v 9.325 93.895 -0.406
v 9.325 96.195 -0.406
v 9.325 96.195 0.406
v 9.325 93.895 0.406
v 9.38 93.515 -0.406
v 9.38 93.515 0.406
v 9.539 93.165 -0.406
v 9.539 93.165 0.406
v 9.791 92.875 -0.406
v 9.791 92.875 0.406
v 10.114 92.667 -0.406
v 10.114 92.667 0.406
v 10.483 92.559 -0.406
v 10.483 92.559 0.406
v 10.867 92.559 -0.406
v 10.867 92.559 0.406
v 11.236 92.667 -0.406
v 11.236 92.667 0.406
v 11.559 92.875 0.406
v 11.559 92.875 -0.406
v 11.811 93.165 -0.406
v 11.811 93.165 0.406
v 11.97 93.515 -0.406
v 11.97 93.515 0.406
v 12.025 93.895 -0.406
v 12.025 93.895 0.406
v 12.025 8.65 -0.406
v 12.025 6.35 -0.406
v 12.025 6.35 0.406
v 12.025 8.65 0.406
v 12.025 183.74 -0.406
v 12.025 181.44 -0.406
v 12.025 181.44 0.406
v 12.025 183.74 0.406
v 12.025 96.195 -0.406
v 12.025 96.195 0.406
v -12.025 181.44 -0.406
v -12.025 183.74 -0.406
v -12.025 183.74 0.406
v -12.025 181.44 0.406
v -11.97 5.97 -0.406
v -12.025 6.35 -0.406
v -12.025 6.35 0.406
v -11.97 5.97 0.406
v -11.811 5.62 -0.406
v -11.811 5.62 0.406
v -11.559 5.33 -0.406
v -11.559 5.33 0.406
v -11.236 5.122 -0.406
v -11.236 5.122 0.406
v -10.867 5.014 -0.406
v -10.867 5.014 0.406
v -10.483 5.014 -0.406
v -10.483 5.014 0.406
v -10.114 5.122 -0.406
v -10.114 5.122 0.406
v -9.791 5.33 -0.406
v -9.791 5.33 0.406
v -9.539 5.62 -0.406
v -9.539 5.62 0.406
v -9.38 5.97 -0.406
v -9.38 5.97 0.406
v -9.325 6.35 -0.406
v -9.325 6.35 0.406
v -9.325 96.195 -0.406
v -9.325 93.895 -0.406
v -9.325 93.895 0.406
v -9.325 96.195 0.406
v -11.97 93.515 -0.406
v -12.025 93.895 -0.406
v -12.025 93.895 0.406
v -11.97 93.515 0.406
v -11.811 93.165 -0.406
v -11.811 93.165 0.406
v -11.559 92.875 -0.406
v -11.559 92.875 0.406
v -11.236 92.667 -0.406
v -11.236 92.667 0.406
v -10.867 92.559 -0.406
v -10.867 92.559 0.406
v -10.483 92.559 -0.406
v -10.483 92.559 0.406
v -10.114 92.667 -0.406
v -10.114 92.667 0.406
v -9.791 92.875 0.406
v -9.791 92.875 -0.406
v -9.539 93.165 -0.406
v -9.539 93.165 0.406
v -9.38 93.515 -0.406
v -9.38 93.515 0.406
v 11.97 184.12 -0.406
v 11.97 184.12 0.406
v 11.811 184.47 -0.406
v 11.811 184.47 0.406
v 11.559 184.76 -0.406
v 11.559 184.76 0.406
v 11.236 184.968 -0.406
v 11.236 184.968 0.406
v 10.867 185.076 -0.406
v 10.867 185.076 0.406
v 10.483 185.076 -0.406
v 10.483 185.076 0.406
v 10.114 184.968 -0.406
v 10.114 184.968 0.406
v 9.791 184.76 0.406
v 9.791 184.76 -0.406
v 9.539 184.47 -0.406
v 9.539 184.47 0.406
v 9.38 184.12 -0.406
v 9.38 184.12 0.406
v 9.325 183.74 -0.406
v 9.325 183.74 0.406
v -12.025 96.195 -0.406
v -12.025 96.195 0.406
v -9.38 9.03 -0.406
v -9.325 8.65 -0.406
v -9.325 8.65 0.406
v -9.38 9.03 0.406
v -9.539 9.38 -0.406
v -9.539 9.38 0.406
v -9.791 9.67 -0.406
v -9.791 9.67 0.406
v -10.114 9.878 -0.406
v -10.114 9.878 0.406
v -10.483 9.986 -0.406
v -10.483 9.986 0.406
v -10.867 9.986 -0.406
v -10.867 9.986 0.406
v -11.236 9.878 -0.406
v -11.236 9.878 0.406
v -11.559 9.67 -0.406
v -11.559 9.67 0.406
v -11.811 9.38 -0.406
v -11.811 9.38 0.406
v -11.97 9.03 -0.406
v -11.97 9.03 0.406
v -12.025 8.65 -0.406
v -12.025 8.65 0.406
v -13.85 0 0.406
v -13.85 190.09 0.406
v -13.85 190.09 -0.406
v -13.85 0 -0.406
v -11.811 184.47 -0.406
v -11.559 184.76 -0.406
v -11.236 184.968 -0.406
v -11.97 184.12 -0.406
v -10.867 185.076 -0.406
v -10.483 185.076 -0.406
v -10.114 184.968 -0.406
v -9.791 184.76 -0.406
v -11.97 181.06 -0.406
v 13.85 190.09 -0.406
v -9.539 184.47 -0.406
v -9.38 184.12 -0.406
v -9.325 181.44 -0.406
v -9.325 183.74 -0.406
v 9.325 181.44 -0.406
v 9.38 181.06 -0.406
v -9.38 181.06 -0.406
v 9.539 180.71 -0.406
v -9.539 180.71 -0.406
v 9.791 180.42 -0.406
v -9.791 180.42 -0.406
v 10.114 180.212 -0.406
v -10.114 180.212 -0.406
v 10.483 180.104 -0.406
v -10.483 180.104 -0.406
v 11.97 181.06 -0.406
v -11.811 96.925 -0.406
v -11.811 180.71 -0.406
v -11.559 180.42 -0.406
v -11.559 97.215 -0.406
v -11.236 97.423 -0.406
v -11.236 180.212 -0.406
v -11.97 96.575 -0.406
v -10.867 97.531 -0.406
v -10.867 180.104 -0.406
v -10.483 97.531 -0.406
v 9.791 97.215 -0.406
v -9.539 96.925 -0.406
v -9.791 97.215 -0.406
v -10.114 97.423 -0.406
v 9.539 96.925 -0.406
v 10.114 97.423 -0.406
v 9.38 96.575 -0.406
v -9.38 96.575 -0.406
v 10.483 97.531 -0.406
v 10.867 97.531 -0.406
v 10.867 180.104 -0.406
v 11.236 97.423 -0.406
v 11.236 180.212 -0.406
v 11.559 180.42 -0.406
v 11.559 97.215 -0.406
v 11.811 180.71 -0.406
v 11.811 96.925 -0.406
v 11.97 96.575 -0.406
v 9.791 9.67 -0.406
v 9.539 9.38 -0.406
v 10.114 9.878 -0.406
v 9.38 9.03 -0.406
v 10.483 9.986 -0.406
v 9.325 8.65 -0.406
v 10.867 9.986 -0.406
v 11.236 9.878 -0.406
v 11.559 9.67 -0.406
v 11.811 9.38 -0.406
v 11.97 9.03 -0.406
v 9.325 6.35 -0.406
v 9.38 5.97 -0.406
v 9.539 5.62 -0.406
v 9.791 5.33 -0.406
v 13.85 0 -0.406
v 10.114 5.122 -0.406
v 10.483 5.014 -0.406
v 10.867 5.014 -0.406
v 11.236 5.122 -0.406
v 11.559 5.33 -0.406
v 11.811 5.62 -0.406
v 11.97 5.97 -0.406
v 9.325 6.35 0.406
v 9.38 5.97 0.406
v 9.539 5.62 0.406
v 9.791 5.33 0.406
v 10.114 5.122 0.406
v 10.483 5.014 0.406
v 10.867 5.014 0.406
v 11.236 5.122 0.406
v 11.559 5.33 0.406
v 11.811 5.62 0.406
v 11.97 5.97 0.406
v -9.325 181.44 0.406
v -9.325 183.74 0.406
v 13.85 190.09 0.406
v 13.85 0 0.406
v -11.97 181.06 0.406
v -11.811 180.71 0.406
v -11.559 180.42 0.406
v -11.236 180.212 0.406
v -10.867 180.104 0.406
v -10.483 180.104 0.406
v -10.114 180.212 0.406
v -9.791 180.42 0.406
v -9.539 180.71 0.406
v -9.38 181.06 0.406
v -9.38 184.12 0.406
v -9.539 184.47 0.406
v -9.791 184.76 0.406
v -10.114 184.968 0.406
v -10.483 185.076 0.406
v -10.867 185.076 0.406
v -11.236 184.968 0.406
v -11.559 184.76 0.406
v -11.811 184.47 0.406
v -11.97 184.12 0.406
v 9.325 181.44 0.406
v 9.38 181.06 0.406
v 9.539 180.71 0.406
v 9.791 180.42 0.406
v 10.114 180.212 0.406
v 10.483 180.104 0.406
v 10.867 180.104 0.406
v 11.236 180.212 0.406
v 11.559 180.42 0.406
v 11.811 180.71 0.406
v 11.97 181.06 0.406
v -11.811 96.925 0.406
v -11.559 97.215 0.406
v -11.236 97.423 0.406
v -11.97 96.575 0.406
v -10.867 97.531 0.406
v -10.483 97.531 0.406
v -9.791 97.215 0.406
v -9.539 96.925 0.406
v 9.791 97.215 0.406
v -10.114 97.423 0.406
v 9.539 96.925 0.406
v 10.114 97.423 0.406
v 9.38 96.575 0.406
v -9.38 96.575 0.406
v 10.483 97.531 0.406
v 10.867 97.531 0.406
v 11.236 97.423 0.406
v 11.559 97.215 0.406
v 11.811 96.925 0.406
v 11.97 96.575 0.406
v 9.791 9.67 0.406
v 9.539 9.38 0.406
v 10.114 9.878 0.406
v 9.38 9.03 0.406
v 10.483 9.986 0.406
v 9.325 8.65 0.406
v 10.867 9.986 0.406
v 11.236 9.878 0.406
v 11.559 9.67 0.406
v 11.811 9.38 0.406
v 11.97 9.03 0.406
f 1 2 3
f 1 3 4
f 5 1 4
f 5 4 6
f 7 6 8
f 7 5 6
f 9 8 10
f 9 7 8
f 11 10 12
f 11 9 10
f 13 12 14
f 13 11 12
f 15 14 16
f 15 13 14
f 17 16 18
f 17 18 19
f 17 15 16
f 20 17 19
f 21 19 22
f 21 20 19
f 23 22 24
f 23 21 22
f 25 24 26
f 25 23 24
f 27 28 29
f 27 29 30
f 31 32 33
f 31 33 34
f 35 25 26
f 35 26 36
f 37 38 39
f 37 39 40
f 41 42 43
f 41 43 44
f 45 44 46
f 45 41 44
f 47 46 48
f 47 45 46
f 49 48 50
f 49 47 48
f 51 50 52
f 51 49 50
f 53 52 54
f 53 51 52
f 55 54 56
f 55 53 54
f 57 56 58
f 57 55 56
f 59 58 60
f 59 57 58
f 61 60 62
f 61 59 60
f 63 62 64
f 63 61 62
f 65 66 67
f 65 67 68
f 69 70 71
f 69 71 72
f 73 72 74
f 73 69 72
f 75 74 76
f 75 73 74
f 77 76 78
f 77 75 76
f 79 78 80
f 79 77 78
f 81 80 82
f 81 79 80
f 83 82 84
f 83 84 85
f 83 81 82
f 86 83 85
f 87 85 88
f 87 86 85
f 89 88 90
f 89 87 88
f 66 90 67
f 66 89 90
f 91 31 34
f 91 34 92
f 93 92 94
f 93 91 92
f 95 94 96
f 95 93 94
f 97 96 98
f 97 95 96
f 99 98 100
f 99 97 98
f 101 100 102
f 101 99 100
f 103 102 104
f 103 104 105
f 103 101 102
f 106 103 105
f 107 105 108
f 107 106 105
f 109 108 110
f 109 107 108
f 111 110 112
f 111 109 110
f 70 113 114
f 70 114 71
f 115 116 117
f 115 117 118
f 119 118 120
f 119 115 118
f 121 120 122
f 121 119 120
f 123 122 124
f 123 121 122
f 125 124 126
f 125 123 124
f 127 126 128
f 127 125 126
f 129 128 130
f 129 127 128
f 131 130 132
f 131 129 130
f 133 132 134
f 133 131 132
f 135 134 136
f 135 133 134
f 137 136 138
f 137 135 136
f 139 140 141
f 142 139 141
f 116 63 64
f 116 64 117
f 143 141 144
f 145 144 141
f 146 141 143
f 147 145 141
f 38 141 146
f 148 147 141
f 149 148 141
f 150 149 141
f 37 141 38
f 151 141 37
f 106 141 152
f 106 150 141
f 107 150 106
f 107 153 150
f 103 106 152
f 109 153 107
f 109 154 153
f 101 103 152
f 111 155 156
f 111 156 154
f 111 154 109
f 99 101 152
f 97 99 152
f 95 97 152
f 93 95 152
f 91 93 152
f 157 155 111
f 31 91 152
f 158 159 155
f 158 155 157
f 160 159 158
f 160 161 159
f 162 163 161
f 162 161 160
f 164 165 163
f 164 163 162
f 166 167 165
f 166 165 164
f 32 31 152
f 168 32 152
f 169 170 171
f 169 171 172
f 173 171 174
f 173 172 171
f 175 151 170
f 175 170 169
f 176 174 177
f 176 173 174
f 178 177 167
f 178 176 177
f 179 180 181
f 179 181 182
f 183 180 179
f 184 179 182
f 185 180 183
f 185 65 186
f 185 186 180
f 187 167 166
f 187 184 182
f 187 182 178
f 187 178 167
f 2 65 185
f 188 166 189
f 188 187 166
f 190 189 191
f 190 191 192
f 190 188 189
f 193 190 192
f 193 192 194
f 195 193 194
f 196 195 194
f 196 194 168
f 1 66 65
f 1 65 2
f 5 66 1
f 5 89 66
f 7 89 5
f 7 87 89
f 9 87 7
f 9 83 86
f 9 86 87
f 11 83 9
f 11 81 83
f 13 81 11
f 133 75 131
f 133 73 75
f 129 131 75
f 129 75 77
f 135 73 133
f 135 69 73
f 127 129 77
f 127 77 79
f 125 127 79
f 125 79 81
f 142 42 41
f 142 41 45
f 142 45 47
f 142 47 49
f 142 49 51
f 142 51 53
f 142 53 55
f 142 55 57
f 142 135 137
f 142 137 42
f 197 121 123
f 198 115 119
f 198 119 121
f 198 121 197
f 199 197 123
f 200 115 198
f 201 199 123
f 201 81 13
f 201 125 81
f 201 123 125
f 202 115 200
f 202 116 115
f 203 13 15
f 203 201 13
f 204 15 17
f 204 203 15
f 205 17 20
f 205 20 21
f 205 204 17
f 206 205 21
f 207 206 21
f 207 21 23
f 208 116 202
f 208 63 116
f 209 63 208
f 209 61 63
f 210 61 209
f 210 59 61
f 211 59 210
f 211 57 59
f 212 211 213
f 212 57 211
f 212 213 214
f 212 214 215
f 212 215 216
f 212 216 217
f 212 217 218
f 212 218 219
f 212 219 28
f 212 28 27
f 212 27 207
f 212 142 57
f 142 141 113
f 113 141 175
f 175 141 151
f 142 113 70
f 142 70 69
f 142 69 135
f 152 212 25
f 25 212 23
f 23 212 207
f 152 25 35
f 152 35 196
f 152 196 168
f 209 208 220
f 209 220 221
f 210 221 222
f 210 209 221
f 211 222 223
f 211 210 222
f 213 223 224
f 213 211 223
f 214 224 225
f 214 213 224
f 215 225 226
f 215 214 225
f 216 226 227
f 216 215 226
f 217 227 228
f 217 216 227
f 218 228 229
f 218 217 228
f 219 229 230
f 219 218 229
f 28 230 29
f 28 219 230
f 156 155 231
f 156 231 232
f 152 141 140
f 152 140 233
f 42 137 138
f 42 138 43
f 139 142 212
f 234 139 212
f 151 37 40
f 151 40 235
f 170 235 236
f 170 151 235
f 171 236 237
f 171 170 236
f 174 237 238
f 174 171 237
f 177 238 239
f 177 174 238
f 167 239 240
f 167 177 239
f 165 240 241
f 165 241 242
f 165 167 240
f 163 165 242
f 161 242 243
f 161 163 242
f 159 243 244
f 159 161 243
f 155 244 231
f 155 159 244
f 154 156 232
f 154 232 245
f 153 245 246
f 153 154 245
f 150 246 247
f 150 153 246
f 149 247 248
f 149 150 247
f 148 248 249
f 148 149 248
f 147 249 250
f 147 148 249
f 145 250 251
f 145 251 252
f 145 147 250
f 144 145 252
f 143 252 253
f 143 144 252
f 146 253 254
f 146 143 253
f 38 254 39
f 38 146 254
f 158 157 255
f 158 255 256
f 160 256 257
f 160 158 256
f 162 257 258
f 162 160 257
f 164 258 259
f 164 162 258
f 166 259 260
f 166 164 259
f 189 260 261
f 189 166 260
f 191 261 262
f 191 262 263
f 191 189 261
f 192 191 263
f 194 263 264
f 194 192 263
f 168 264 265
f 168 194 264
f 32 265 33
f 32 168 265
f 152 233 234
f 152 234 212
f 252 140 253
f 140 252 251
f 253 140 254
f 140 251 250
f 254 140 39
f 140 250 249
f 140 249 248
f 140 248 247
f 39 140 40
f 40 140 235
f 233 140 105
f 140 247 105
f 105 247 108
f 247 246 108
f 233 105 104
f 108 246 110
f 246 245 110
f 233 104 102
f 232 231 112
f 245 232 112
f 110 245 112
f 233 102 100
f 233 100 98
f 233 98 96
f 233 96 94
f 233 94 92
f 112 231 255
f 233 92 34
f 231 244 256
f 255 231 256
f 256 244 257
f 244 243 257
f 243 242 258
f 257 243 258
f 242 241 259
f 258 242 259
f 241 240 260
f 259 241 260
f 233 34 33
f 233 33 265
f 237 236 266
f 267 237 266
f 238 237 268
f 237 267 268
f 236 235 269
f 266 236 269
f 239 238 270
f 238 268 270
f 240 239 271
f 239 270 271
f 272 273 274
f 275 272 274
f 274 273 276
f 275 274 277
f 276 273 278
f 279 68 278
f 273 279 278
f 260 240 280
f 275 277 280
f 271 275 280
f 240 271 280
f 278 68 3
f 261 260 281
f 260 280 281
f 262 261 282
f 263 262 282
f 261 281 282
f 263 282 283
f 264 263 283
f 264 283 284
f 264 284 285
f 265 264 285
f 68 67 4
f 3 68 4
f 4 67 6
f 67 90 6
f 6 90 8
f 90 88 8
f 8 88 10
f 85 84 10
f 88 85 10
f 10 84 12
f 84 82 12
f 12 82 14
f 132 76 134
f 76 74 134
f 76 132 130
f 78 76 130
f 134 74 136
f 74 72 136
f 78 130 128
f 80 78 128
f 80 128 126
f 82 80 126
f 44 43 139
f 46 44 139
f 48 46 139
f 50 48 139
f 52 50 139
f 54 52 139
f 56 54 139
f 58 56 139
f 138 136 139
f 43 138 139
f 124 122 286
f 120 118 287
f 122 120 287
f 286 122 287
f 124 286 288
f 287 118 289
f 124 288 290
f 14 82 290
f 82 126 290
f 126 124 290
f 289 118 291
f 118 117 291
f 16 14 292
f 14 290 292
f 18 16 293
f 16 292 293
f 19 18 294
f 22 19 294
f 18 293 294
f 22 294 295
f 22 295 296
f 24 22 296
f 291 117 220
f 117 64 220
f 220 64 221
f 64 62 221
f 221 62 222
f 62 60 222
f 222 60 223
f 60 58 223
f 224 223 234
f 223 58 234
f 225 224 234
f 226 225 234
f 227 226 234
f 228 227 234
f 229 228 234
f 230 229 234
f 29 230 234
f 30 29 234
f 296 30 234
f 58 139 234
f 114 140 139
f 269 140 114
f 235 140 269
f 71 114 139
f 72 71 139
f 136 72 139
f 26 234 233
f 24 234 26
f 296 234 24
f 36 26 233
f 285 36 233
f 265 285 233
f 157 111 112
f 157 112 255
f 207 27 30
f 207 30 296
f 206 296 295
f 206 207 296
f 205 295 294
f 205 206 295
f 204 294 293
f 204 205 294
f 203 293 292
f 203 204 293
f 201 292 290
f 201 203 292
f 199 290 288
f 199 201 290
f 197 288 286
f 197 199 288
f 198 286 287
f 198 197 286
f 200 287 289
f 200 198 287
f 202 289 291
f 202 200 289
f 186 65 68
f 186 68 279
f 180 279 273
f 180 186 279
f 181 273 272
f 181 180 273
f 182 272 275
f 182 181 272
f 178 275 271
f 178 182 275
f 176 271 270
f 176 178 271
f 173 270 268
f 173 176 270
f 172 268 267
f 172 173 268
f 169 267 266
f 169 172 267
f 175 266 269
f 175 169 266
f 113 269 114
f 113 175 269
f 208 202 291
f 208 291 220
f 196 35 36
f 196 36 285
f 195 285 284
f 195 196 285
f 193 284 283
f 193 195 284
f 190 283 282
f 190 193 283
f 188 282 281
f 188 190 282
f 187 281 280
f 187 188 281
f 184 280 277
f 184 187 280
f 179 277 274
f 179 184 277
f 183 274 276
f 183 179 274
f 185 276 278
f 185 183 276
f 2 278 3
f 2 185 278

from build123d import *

# Parameters (mm, degrees)
SKETCH1_W                  = 27.7
SKETCH1_H                  = 0.8128
BOSS_EXTRUDE1_DEPTH        = 190.09
M2_5_START                 = -0.4064
M2_5_CLEARANCE_SLOT2_DEPTH = 0.8128


# Read off the part's stored shape, not the designer's step: M2.5 Clearance Slot2
with BuildPart() as part:
    # Sketch1 → Boss-Extrude1 (new body)
    with BuildSketch(Plane(origin=(0, 0, 0), x_dir=(1, 0, 0), z_dir=(0, 1, 0))):
        Rectangle(SKETCH1_W, SKETCH1_H)
    extrude(amount=BOSS_EXTRUDE1_DEPTH)

    # M2.5 Clearance Slot2 outline → M2.5 Clearance Slot2 (cut)
    with BuildSketch(Plane.XY.offset(M2_5_START)):
        with BuildLine():
            ThreePointArc((-9.325, 96.195), (-10.675, 97.545), (-12.025, 96.195))
            Line((-12.025, 96.195), (-12.025, 93.895))
            ThreePointArc((-12.025, 93.895), (-10.675, 92.545), (-9.325, 93.895))
            Line((-9.325, 93.895), (-9.325, 96.195))
        make_face()
        with BuildLine():
            Line((-9.325, 181.44), (-9.325, 183.74))
            ThreePointArc((-9.325, 183.74), (-10.675, 185.09), (-12.025, 183.74))
            Line((-12.025, 183.74), (-12.025, 181.44))
            ThreePointArc((-12.025, 181.44), (-10.675, 180.09), (-9.325, 181.44))
        make_face()
        with BuildLine():
            Line((-9.325, 6.35), (-9.325, 8.65))
            ThreePointArc((-9.325, 8.65), (-10.675, 10), (-12.025, 8.65))
            Line((-12.025, 8.65), (-12.025, 6.35))
            ThreePointArc((-12.025, 6.35), (-10.675, 5), (-9.325, 6.35))
        make_face()
        with BuildLine():
            ThreePointArc((12.025, 96.195), (10.675, 97.545), (9.325, 96.195))
            Line((9.325, 96.195), (9.325, 93.895))
            ThreePointArc((9.325, 93.895), (10.675, 92.545), (12.025, 93.895))
            Line((12.025, 93.895), (12.025, 96.195))
        make_face()
        with BuildLine():
            Line((12.025, 181.44), (12.025, 183.74))
            ThreePointArc((12.025, 183.74), (10.675, 185.09), (9.325, 183.74))
            Line((9.325, 183.74), (9.325, 181.44))
            ThreePointArc((9.325, 181.44), (10.675, 180.09), (12.025, 181.44))
        make_face()
        with BuildLine():
            Line((12.025, 6.35), (12.025, 8.65))
            ThreePointArc((12.025, 8.65), (10.675, 10), (9.325, 8.65))
            Line((9.325, 8.65), (9.325, 6.35))
            ThreePointArc((9.325, 6.35), (10.675, 5), (12.025, 6.35))
        make_face()
    extrude(amount=M2_5_CLEARANCE_SLOT2_DEPTH, mode=Mode.SUBTRACT)


solid = part.part
